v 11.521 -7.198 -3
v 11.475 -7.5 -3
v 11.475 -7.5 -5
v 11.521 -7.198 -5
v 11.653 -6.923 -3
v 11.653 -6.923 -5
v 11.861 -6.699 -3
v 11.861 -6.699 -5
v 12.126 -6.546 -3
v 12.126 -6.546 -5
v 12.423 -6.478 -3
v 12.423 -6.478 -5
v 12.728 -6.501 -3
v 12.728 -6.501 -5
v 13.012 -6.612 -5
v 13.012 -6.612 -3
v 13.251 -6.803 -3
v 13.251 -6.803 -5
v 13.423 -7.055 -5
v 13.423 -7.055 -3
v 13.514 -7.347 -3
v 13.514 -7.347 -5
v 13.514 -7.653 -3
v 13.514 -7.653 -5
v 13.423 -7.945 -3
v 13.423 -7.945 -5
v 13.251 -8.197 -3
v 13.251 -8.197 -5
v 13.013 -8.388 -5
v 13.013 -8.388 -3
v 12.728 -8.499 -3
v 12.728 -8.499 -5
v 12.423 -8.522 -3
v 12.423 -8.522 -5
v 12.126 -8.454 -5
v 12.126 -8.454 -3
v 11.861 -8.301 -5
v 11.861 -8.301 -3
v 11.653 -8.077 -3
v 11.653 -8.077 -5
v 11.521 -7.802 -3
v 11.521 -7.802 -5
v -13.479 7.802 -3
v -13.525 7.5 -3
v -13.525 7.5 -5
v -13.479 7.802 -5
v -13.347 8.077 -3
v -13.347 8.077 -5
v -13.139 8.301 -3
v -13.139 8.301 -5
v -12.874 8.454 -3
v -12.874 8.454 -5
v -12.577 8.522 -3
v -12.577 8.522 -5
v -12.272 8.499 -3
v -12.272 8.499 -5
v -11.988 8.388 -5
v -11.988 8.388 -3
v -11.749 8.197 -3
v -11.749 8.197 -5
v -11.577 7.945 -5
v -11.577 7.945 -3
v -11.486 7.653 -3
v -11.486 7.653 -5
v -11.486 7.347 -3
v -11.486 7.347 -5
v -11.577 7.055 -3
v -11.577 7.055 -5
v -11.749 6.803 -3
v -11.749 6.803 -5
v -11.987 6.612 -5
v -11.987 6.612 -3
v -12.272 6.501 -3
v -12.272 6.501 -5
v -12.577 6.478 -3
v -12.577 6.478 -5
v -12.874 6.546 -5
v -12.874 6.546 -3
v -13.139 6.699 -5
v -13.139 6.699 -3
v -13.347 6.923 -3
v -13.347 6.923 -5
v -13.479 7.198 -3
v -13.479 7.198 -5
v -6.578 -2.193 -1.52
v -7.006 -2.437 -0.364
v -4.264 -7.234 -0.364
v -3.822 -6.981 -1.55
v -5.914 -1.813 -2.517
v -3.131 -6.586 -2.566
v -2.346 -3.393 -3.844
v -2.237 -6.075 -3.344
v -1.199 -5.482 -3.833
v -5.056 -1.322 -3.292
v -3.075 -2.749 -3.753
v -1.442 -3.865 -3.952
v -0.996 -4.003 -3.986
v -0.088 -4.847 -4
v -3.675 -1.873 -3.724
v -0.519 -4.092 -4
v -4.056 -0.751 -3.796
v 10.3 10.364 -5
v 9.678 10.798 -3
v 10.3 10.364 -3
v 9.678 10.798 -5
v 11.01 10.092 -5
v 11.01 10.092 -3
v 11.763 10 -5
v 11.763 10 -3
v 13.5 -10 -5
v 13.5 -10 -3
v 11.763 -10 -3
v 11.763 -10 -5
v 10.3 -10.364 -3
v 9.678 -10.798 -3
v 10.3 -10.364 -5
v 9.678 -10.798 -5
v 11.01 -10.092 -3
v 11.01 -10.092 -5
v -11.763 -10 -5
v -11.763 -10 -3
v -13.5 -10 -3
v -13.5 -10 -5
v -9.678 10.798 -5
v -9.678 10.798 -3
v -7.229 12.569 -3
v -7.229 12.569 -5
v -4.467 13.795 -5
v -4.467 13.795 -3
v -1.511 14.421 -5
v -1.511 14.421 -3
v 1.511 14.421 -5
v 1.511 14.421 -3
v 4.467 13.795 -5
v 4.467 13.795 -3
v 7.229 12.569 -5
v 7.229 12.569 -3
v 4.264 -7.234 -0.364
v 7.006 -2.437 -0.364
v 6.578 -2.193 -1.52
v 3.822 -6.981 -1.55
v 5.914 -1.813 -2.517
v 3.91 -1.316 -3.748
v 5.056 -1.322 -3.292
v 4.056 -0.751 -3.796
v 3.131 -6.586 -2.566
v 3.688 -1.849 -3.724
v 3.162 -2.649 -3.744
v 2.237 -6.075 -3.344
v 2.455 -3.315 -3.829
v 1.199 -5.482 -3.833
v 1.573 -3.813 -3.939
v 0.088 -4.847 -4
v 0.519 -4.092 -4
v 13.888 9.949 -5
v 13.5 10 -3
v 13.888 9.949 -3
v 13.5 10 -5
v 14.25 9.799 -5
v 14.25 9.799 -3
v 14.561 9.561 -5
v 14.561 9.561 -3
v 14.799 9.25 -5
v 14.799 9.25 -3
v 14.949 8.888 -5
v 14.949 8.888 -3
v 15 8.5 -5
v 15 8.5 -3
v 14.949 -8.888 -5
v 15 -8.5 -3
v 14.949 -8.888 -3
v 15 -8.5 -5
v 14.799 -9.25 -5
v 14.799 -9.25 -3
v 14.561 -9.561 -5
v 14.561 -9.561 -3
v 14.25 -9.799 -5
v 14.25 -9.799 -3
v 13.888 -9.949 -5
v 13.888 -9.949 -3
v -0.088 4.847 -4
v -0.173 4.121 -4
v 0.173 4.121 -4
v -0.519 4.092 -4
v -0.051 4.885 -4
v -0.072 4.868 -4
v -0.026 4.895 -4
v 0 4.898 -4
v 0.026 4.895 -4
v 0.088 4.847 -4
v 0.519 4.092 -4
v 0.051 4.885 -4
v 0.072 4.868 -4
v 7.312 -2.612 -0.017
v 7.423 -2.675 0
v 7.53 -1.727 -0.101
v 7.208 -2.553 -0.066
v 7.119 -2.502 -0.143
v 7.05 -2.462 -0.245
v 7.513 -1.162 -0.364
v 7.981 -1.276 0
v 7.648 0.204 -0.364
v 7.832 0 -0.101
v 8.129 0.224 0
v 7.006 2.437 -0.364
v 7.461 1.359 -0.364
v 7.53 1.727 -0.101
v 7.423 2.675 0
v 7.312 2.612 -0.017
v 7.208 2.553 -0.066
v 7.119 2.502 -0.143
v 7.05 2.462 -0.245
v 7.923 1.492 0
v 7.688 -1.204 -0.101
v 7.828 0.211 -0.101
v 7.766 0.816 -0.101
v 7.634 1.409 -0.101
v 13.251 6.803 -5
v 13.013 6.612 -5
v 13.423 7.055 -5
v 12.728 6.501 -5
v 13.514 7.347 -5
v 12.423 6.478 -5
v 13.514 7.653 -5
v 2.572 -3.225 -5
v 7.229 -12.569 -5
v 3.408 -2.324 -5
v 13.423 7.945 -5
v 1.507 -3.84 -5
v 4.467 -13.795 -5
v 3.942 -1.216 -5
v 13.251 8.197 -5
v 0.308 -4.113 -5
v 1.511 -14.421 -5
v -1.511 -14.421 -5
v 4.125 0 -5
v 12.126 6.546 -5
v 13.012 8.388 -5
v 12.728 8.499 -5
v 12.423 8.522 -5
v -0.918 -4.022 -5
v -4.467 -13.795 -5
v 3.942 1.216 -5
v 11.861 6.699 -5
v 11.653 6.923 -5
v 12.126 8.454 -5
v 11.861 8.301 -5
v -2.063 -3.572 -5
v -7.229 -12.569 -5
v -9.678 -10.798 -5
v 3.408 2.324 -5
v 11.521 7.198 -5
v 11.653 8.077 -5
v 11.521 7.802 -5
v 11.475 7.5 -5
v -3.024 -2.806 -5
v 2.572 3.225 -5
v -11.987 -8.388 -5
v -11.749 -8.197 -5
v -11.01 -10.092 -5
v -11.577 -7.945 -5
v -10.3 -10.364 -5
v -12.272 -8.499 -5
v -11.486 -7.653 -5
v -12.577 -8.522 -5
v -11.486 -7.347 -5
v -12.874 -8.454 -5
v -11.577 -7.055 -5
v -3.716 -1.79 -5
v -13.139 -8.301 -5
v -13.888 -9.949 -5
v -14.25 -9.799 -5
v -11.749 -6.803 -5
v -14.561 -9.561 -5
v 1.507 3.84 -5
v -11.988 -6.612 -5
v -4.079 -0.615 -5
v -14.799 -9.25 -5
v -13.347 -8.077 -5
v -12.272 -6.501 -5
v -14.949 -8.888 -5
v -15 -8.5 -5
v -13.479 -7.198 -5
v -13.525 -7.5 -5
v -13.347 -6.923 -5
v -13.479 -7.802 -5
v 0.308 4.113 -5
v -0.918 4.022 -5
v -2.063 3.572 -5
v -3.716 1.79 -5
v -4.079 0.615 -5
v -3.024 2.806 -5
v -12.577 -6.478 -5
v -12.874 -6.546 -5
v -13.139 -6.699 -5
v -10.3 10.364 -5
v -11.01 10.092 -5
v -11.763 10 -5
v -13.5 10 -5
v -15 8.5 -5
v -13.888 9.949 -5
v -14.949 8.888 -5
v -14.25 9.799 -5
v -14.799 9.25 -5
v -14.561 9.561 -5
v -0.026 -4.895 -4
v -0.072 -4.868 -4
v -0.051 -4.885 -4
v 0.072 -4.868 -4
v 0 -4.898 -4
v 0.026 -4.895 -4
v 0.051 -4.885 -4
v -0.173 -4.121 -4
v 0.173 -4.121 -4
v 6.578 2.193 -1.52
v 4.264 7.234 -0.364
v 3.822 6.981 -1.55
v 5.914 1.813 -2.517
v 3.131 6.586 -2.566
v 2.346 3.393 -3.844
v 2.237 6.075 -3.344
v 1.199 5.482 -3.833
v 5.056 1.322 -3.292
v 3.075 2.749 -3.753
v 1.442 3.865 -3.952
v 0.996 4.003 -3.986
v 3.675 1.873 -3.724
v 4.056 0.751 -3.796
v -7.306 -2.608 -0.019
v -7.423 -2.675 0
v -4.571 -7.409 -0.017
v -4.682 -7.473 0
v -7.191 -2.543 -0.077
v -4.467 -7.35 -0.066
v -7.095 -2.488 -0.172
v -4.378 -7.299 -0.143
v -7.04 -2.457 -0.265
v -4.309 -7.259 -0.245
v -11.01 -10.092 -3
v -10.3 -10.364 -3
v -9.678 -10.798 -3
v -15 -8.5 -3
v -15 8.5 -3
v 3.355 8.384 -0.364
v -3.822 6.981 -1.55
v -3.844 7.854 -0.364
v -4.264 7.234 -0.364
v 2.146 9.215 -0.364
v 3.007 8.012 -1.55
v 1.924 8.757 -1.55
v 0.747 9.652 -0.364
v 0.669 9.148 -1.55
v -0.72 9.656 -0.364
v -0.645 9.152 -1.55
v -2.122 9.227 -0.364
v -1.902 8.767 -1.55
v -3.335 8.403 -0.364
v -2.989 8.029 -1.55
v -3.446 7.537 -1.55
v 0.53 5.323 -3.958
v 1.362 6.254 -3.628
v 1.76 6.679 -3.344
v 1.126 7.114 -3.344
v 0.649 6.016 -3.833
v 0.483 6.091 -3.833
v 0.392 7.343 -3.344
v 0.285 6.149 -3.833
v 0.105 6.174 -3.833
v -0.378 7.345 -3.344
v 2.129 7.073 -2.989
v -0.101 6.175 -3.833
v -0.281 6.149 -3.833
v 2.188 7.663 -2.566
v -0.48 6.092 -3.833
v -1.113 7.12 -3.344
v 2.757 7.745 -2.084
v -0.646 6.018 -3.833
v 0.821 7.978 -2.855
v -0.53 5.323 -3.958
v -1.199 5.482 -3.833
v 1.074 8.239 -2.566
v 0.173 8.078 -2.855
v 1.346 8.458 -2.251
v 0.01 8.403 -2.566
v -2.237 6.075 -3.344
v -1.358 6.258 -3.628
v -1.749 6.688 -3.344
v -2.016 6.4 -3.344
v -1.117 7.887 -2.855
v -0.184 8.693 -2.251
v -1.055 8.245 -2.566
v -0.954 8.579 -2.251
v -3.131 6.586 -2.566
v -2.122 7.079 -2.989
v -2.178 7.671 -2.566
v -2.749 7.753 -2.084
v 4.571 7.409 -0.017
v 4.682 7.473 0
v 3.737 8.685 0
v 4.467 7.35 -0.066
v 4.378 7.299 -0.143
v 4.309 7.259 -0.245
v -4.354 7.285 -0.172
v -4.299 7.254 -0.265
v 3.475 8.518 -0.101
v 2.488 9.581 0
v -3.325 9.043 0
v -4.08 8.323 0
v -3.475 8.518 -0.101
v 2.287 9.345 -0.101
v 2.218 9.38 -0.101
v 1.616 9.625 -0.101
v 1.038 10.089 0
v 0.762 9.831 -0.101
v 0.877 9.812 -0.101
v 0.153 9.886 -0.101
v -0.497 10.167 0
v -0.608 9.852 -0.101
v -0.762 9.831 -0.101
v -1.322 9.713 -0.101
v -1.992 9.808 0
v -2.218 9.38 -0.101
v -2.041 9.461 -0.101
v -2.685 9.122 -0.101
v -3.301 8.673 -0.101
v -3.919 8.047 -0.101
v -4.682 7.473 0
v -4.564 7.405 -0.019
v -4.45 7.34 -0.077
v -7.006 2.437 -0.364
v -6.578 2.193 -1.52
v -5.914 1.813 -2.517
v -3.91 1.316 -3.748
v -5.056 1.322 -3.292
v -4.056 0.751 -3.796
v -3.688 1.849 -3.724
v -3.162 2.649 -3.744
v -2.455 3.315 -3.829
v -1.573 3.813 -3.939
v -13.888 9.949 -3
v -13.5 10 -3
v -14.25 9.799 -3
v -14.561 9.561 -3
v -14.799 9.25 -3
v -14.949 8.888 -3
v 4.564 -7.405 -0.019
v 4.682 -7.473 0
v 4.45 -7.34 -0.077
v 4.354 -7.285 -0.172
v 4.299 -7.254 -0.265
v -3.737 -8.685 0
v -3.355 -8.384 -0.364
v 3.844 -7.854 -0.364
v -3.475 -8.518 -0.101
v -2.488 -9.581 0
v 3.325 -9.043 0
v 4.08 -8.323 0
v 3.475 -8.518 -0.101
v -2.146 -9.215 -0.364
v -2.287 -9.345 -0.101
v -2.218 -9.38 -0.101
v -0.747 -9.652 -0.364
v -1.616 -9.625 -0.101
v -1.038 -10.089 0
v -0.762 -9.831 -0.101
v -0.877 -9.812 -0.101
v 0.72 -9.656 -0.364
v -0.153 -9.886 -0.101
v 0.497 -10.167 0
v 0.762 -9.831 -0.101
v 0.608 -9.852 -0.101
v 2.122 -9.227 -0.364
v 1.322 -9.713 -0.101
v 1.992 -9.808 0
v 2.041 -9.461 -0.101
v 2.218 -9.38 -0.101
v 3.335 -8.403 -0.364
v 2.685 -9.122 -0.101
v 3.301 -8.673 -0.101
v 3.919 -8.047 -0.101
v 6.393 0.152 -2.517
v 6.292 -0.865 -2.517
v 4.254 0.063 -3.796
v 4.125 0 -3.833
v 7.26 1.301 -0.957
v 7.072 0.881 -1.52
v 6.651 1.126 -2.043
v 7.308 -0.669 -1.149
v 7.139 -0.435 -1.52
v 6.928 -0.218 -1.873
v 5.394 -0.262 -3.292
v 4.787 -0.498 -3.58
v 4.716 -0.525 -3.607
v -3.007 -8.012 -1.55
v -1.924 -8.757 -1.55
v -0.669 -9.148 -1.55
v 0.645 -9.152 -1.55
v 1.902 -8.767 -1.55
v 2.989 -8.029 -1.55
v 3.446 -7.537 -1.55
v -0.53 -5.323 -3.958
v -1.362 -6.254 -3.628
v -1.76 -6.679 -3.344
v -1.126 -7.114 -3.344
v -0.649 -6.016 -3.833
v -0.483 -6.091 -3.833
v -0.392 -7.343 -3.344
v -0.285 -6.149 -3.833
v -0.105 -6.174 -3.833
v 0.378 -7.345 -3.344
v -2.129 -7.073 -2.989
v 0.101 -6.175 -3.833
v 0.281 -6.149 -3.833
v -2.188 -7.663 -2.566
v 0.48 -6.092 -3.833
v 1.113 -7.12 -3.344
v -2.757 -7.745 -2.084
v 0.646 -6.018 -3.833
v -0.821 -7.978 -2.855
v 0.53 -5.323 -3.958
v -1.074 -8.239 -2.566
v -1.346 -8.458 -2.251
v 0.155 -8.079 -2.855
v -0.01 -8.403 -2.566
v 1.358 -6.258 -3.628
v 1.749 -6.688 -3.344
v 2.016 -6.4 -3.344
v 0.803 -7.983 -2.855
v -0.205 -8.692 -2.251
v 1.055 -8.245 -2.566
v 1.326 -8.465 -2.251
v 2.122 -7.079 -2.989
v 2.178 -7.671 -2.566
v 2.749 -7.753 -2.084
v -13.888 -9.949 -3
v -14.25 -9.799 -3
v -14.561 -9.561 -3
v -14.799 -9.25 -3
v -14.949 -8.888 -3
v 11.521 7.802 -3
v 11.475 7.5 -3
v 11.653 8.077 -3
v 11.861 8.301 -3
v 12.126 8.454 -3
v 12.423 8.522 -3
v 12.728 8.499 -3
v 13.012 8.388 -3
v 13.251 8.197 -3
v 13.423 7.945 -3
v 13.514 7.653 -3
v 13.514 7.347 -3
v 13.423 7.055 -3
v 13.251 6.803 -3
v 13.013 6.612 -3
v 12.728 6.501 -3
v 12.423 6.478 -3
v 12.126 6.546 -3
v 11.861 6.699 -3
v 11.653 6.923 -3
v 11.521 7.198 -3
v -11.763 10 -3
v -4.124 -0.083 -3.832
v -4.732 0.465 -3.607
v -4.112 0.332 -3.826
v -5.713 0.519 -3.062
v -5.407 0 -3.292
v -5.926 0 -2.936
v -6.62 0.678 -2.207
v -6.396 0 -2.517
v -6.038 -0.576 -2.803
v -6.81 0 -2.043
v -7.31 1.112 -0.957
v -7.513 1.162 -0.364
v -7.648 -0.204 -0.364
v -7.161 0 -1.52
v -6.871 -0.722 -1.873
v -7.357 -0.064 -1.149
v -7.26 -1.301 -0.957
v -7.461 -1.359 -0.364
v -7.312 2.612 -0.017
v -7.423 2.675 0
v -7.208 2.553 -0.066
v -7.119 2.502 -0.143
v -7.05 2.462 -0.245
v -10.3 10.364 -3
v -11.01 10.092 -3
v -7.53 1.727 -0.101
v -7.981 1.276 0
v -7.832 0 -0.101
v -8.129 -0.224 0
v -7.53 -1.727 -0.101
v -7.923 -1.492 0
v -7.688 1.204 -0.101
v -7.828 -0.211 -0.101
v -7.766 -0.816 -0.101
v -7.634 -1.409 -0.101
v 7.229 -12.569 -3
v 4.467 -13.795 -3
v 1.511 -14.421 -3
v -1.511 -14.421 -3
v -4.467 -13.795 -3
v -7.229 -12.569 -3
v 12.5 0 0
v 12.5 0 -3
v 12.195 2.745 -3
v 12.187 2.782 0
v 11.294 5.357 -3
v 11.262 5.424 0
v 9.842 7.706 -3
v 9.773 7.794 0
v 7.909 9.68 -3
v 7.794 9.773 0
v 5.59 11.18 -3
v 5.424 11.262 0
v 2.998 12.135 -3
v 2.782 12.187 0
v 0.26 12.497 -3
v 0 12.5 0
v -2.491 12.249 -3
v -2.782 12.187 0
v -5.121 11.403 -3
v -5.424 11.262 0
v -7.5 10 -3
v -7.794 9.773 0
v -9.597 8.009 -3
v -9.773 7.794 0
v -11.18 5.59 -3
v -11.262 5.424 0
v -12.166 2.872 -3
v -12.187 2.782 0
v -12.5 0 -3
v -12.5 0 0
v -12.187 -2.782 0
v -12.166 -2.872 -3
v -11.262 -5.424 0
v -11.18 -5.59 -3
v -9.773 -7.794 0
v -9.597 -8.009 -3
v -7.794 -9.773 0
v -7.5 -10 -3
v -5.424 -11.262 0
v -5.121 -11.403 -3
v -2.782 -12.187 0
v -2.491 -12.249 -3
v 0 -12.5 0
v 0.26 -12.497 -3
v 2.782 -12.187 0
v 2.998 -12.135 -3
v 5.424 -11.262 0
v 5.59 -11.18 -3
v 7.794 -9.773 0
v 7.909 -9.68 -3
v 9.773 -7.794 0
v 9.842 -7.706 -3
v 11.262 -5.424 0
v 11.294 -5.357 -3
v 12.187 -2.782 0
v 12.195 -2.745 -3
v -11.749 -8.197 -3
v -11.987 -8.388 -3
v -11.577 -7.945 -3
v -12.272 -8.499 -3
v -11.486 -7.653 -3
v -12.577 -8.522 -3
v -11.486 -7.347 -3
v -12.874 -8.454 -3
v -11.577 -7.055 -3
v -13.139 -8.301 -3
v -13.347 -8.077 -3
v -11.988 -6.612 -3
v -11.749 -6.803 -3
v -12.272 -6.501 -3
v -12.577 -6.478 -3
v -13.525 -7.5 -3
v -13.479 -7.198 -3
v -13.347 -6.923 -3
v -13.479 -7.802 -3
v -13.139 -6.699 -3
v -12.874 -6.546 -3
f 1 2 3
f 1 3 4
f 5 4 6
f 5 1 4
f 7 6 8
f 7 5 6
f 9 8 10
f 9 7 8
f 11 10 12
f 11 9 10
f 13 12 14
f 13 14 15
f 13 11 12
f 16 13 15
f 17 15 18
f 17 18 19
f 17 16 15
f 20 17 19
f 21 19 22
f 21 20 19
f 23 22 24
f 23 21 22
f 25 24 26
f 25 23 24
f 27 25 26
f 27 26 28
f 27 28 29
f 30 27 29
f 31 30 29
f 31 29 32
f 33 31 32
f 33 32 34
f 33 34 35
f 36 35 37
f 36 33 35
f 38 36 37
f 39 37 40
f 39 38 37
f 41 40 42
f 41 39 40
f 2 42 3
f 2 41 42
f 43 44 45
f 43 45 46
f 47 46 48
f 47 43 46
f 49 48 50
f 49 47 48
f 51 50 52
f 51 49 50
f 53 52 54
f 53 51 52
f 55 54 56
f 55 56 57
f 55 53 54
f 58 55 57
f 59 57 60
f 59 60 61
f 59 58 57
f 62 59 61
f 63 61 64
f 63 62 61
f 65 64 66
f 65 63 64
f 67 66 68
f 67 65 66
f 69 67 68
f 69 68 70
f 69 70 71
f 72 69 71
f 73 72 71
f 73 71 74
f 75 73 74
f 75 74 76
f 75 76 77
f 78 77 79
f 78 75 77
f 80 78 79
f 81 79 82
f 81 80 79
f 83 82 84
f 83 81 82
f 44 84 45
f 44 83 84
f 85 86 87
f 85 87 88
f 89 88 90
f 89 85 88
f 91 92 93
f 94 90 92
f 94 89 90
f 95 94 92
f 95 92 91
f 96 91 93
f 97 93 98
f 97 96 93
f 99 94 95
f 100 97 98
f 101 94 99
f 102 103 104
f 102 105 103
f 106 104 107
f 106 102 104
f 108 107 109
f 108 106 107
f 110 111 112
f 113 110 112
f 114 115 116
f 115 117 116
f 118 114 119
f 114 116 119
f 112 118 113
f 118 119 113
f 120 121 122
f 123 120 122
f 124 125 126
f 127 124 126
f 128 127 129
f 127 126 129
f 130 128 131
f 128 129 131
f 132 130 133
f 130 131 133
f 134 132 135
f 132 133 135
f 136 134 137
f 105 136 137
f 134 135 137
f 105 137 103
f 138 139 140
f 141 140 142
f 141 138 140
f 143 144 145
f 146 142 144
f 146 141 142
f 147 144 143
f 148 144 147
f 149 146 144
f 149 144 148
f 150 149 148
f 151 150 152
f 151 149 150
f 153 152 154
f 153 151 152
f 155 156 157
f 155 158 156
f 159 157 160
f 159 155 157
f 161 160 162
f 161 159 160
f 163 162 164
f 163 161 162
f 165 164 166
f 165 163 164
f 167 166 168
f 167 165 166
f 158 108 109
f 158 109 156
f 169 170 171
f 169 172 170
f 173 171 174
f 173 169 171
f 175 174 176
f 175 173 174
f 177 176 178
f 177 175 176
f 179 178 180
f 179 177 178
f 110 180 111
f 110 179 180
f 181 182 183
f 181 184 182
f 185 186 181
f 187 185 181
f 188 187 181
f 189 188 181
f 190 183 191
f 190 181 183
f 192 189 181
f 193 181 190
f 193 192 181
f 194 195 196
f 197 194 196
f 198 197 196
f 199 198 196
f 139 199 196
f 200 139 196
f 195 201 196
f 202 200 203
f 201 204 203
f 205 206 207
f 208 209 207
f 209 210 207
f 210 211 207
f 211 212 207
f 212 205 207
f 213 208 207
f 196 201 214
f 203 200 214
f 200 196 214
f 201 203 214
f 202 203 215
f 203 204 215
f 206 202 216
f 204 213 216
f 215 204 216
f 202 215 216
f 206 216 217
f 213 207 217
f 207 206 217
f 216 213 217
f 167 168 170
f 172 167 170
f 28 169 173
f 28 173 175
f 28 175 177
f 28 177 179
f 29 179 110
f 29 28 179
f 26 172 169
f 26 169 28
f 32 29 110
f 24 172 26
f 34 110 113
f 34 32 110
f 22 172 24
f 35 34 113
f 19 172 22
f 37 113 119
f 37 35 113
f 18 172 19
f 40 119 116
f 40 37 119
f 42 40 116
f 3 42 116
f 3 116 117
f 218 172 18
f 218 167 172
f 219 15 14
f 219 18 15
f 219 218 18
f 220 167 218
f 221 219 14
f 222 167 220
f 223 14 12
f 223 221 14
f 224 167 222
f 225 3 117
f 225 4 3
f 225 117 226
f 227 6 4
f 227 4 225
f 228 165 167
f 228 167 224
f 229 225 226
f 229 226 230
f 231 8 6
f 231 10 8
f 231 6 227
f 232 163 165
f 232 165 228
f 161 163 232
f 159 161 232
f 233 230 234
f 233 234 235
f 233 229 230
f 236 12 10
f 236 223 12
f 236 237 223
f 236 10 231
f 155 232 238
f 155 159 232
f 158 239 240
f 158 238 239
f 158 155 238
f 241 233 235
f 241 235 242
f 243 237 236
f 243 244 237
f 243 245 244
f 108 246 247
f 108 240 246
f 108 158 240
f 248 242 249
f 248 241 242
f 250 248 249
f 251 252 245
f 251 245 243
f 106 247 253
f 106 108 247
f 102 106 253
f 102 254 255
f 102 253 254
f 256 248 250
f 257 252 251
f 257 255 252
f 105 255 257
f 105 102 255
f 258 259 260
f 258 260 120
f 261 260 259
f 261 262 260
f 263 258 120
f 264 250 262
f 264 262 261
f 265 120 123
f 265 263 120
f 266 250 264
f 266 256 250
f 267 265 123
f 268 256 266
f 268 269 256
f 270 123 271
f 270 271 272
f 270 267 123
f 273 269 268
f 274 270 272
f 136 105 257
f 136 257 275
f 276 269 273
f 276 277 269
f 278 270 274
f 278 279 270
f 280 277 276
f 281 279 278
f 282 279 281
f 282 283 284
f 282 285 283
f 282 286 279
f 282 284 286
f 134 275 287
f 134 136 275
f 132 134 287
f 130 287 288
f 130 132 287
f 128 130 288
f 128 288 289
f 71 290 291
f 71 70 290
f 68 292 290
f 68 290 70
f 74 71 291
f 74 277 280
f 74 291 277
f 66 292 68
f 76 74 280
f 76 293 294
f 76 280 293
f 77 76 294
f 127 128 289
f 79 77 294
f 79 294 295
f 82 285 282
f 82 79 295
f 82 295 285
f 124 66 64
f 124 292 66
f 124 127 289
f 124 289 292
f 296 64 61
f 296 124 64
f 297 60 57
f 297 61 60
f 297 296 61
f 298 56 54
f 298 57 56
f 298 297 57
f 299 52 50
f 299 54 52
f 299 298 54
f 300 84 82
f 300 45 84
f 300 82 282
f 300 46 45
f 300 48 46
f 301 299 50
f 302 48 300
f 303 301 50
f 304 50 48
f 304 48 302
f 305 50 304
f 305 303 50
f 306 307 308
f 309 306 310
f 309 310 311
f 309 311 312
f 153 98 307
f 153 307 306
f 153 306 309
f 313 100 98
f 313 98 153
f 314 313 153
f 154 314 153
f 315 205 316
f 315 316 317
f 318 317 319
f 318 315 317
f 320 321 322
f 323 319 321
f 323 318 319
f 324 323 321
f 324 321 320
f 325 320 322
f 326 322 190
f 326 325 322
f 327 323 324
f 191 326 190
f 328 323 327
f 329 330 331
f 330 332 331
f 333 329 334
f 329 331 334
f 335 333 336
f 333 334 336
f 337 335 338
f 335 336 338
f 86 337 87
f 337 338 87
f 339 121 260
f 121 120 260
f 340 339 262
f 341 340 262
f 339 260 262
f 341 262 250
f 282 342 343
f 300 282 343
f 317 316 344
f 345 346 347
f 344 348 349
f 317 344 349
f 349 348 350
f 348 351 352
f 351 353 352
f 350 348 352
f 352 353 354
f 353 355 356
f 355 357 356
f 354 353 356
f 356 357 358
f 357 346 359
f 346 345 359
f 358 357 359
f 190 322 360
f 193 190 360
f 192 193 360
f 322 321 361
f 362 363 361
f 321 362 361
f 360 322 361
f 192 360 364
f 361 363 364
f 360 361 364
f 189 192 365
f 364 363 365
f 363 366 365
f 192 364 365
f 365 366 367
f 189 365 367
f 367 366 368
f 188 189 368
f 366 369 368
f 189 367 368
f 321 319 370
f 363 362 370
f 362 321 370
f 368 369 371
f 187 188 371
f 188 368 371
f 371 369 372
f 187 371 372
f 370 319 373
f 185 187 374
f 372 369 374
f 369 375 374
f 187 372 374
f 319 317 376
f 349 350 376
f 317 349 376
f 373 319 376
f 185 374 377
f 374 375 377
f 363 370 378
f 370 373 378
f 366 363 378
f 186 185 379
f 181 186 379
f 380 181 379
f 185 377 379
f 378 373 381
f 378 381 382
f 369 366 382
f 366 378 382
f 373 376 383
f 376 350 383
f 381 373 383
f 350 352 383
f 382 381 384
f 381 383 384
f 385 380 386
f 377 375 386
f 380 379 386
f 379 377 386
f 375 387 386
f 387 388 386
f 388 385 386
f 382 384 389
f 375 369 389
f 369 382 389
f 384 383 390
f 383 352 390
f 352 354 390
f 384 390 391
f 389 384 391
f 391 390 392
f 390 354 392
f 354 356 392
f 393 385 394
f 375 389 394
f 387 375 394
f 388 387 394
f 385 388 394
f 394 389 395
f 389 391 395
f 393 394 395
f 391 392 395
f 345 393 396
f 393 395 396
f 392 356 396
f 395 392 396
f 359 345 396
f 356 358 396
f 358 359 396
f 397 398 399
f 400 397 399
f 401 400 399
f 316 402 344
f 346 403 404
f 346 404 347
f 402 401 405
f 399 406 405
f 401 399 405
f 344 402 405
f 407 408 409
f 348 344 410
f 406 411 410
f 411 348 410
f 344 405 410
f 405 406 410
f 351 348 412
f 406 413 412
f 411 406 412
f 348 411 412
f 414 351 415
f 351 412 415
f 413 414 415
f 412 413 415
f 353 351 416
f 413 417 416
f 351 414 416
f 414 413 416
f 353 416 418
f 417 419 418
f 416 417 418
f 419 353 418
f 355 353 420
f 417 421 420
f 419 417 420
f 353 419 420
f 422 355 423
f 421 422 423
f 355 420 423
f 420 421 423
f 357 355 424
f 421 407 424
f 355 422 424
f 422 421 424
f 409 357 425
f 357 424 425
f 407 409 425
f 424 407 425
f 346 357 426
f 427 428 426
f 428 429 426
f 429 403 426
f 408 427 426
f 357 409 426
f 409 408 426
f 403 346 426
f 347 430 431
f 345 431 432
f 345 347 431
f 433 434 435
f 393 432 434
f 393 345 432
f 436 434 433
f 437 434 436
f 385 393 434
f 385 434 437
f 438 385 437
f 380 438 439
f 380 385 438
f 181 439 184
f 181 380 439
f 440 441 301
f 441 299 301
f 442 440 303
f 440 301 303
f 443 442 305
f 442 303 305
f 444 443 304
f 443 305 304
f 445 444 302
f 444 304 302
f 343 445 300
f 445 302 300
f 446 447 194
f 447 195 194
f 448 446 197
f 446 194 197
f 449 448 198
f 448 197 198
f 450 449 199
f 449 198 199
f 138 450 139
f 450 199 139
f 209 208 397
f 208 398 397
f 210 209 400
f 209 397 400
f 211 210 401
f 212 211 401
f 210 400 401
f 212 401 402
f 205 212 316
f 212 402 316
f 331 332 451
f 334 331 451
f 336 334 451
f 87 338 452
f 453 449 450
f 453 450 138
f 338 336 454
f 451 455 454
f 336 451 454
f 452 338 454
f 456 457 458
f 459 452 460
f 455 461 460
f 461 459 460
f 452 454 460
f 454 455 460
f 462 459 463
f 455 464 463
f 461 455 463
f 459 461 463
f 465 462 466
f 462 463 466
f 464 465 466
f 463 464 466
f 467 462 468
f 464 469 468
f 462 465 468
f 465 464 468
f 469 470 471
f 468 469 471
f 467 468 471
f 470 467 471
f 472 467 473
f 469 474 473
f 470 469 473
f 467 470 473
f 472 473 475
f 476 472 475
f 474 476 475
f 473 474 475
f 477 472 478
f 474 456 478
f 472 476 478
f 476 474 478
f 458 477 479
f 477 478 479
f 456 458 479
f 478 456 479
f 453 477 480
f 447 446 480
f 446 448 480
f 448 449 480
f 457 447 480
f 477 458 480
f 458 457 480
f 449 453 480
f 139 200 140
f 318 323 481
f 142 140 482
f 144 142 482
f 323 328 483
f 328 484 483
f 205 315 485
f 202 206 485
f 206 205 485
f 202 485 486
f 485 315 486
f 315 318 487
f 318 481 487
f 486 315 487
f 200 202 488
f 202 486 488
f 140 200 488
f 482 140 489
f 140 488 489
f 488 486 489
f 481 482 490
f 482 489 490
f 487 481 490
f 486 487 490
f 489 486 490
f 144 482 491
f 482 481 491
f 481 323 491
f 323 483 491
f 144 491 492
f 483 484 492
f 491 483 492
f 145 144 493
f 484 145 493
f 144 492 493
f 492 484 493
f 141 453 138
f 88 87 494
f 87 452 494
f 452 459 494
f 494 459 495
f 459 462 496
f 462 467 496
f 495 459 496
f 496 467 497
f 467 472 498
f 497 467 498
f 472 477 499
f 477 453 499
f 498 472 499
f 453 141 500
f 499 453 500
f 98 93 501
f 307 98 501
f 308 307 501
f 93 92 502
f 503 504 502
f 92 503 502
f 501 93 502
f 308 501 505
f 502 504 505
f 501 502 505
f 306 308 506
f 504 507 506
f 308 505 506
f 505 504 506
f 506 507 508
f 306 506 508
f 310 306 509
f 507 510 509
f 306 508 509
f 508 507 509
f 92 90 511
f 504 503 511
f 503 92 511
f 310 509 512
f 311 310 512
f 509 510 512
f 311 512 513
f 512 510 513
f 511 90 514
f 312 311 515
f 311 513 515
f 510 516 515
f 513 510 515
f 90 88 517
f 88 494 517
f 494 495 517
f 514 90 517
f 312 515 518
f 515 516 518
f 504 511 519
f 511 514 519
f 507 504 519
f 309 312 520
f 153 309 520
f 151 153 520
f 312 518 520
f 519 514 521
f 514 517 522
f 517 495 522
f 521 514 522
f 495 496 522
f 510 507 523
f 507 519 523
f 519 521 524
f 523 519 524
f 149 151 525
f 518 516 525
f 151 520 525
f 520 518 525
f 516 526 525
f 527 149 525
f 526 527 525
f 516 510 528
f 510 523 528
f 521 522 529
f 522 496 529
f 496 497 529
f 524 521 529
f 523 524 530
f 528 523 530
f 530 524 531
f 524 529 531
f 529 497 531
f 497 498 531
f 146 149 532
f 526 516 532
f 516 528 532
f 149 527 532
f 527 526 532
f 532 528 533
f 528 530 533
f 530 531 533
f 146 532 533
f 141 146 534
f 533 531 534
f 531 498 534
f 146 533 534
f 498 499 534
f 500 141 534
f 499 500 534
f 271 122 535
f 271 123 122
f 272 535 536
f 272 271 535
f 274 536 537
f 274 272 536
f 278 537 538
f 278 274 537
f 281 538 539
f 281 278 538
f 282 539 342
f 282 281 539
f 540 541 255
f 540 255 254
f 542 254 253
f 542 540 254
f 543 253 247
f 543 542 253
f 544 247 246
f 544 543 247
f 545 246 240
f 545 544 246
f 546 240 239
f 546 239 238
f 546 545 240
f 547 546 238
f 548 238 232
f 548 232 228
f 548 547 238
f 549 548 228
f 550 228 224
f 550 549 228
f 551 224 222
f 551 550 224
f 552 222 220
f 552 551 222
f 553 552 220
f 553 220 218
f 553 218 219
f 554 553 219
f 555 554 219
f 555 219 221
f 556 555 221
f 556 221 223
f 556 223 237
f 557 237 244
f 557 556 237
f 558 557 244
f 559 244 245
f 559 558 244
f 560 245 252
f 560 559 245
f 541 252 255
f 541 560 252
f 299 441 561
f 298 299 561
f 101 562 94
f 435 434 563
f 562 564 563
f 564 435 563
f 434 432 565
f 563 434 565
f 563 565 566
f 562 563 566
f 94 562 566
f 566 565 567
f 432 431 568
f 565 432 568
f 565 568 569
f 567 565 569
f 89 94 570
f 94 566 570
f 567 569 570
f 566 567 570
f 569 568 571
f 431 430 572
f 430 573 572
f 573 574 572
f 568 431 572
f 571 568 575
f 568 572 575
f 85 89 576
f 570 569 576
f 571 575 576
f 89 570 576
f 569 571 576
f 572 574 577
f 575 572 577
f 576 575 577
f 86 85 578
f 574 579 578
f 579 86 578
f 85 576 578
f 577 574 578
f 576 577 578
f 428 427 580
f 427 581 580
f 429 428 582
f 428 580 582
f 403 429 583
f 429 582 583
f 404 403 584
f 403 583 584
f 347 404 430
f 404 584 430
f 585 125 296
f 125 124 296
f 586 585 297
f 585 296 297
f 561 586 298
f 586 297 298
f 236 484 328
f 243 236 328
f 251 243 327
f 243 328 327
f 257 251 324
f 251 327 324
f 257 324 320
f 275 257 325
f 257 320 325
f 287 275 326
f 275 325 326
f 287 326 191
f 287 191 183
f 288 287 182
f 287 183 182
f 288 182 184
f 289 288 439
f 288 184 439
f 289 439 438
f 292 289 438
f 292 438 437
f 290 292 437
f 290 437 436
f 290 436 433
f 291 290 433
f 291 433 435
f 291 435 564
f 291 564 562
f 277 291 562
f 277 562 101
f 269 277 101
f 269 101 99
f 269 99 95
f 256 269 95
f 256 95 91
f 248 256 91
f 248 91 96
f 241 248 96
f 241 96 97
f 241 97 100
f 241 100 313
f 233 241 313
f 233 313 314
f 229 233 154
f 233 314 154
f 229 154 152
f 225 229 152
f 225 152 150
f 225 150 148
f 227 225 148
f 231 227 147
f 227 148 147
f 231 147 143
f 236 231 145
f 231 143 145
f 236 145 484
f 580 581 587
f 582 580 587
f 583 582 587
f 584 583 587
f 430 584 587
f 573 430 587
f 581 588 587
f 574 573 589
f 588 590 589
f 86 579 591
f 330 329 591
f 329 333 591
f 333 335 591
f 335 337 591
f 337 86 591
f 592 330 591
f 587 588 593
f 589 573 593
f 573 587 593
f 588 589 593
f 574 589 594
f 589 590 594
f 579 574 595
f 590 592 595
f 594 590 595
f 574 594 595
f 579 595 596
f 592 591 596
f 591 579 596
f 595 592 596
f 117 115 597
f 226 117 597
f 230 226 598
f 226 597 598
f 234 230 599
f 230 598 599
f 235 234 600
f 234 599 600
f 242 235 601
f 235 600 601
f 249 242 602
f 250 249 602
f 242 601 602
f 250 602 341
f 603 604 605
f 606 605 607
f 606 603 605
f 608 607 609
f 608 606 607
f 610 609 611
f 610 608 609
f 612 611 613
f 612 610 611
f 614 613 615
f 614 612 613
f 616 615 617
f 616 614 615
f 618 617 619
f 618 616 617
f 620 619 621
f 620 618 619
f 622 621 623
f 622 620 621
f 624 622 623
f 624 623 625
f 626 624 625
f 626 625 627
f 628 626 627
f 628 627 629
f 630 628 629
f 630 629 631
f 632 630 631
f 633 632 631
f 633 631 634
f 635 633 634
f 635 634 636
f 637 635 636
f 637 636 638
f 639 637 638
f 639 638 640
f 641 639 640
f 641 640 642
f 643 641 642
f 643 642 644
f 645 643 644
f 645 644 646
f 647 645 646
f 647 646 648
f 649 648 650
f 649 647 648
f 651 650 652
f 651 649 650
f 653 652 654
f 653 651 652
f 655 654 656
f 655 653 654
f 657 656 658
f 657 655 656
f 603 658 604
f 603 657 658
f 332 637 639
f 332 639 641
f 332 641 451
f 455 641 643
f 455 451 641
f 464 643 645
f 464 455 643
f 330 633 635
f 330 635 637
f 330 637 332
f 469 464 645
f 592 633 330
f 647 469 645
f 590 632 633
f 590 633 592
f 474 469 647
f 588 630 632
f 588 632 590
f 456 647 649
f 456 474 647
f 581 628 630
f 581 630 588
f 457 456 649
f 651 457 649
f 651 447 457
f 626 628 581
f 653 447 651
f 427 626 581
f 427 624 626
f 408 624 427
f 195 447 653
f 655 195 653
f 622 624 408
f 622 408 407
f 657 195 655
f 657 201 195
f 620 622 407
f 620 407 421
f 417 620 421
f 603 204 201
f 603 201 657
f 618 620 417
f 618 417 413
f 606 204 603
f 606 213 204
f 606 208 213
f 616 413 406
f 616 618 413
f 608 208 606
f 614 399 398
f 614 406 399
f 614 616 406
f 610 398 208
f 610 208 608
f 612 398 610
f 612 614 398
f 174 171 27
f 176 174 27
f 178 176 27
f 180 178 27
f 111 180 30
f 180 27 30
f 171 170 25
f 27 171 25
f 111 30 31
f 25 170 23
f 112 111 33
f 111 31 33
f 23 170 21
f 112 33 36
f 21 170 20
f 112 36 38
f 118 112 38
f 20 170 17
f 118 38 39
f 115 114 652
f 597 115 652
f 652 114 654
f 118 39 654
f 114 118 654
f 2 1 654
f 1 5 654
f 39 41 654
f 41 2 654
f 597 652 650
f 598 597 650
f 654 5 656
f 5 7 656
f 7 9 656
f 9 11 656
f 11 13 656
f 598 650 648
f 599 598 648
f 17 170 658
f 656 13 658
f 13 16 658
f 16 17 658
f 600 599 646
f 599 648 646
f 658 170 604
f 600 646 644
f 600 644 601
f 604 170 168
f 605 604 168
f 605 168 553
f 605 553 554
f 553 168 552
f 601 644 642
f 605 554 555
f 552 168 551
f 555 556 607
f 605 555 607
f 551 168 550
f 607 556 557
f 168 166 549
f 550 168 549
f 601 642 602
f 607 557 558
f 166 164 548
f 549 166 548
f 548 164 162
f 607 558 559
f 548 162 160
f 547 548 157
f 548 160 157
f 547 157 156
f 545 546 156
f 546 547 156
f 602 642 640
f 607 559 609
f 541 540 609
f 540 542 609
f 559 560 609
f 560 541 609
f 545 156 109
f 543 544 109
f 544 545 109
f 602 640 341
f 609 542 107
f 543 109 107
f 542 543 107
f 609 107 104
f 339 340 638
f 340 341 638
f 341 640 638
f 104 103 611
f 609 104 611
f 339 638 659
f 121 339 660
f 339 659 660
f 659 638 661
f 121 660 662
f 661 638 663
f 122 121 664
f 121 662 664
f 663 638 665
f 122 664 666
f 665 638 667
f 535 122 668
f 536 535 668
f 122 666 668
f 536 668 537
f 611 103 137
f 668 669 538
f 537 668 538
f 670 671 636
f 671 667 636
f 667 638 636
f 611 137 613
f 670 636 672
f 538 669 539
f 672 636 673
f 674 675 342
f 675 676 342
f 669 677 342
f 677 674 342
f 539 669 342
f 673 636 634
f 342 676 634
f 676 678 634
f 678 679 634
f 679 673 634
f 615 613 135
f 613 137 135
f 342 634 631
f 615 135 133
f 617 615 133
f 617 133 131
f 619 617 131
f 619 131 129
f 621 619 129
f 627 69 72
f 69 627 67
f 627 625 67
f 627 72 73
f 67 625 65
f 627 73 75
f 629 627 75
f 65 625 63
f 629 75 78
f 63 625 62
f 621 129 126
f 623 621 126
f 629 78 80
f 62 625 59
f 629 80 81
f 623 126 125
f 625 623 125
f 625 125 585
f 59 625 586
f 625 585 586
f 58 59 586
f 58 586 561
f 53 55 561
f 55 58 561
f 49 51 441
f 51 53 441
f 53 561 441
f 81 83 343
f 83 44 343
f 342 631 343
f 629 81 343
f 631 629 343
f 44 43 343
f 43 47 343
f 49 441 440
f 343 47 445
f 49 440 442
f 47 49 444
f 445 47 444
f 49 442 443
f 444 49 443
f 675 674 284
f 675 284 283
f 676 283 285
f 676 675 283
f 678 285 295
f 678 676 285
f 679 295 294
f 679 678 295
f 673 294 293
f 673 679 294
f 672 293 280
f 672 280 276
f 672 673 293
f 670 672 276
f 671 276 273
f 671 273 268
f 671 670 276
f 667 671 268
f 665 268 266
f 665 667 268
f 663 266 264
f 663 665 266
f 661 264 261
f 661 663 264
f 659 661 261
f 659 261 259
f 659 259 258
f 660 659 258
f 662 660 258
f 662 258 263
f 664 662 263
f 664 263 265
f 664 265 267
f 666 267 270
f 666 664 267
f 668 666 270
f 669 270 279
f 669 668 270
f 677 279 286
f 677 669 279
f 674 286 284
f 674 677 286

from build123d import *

# Parameters (mm, degrees)
SKETCH1_R           = 15
BOSS_EXTRUDE1_DEPTH = 5
CUT_EXTRUDE1_DEPTH  = 4
FILLET1_R           = 5
FILLET2_R           = 5
SKETCH4_R           = 4.125
CUT_EXTRUDE2_DEPTH  = 22.794494718
SKETCH7_R           = 15
SKETCH7_R_2         = 12.5
CUT_EXTRUDE3_DEPTH  = 22.794494741
BOSS_EXTRUDE4_START = -2
SKETCH10_R          = 1.025
BOSS_EXTRUDE4_DEPTH = 2
FILLET5_R           = 1.5
BOSS_EXTRUDE5_START = -2
BOSS_EXTRUDE5_DEPTH = 2
FILLET6_R           = 3.125
FILLET7_R           = 0.5


with BuildPart() as part:
    # Sketch1 → Boss-Extrude1 (new body)
    with BuildSketch(Plane.XY):
        Circle(SKETCH1_R)
    extrude(amount=-BOSS_EXTRUDE1_DEPTH)

    # Sketch3 → Cut-Extrude1 (cut)
    with BuildSketch(Plane.XY):
        Polygon((8.5, 0), (0, 14.875), (-8.5, 0), (0, -14.875), align=None)
    extrude(amount=-CUT_EXTRUDE1_DEPTH, mode=Mode.SUBTRACT)

    # Fillet1
    fillet1_edges = [part.edges().sort_by_distance(p)[0] for p in [
        (0, 14.875, -2),
        (8.5, 0, -2),
        (0, -14.875, -2),
        (-8.5, 0, -2),
    ]]
    fillet(fillet1_edges, radius=FILLET1_R)

    # Fillet2
    # the kernel refuses this fillet: 5 mm, written as the material it adds along each edge
    with BuildSketch(Plane(origin=(0, -4.797177815, -4), x_dir=(-0.8682431421244594, -0.4961389383568335, 0), z_dir=(-0.4961389383568335, 0.8682431421244594, 0))) as fillet2_piece_1:
        with BuildLine():
            CenterArc((0.101020514, 5), FILLET2_R, 270, 78.463040967)
            Line((0.101020514, 0), (0.101020514, -0.1))
            Line((0.101020514, -0.1), (5, -0.1))
            Line((5, -0.1), (5.1, 0))
            ThreePointArc((5.1, 0), (5.1, 2), (5.09797959, 3.98))
            Line((5.09797959, 3.98), (5, 4))
        make_face()
    revolve(axis=Axis((0, -4.797177815, -4), (0, 0, 1)), revolution_arc=120.510237406)
    with BuildSketch(Plane(origin=(-7.082460176, -2.480694692, -4), x_dir=(1.3436192329677e-12, 7.677824188386856e-13, 1.0), z_dir=(0.49613893835683387, -0.8682431421244593, 0)), Plane(origin=(-4.341215711, 7.277872506, -4), x_dir=(1.3880008253859177e-12, -7.93143328791953e-13, 1.0), z_dir=(-0.49613893835683387, -0.8682431421244591, 0)), Plane(origin=(7.082460176, 2.480694692, -4), x_dir=(-1.3700903659455922e-12, -7.829087805403382e-13, 1.0), z_dir=(-0.49613893835683376, 0.8682431421244593, 0)), Plane(origin=(4.341215711, -7.277872506, -4), x_dir=(-1.3859204382413136e-12, 7.919545361378934e-13, 1.0), z_dir=(0.49613893835683387, 0.8682431421244593, 0))) as fillet2_piece_2:
        with BuildLine():
            CenterArc((5, -4.898979486), FILLET2_R, 101.536959033, 78.463040967)
            Line((0, -4.898979486), (-0.1, -4.898979486))
            Line((-0.1, -4.898979486), (-0.1, 0))
            Line((-0.1, 0), (0, 0.1))
            ThreePointArc((0, 0.1), (2, 0.1), (3.98, 0.09797959))
            Line((3.98, 0.09797959), (4, 0))
        make_face()
    extrude(amount=5.525154858)
    with BuildSketch(Plane(origin=(-2.741244466, 0, -4), x_dir=(-0.8682431421244594, 0.4961389383568336, 0), z_dir=(0.4961389383568336, 0.8682431421244594, 0))) as fillet2_piece_3:
        with BuildLine():
            CenterArc((0.101020514, 5), FILLET2_R, 270, 78.463040967)
            Line((0.101020514, 0), (0.101020514, -0.1))
            Line((0.101020514, -0.1), (5, -0.1))
            Line((5, -0.1), (5.1, 0))
            ThreePointArc((5.1, 0), (5.1, 2), (5.09797959, 3.98))
            Line((5.09797959, 3.98), (5, 4))
        make_face()
    revolve(axis=Axis((-2.741244466, 0, -4), (0, 0, 1)), revolution_arc=59.489762594)
    with BuildSketch(Plane(origin=(0, 4.797177815, -4), x_dir=(0.8682431421244594, 0.4961389383568332, 0), z_dir=(0.4961389383568332, -0.8682431421244594, 0))) as fillet2_piece_4:
        with BuildLine():
            CenterArc((0.101020514, 5), FILLET2_R, 270, 78.463040967)
            Line((0.101020514, 0), (0.101020514, -0.1))
            Line((0.101020514, -0.1), (5, -0.1))
            Line((5, -0.1), (5.1, 0))
            ThreePointArc((5.1, 0), (5.1, 2), (5.09797959, 3.98))
            Line((5.09797959, 3.98), (5, 4))
        make_face()
    revolve(axis=Axis((0, 4.797177815, -4), (0, 0, 1)), revolution_arc=120.510237406)
    with BuildSketch(Plane(origin=(2.741244466, 0, -4), x_dir=(0.8682431421244592, 0.49613893835683376, 0), z_dir=(-0.49613893835683376, 0.8682431421244592, 0))) as fillet2_piece_5:
        with BuildLine():
            CenterArc((0.101020514, -5), FILLET2_R, 11.536959033, 78.463040967)
            Line((0.101020514, 0), (0.101020514, 0.1))
            Line((0.101020514, 0.1), (5, 0.1))
            Line((5, 0.1), (5.1, 0))
            ThreePointArc((5.1, 0), (5.1, -2), (5.09797959, -3.98))
            Line((5.09797959, -3.98), (5, -4))
        make_face()
    revolve(axis=Axis((2.741244466, 0, -4), (0, 0, -1)), revolution_arc=59.489762594)

    # Sketch4 → Cut-Extrude2 (cut, through all)
    with BuildSketch(Plane.XY):
        Circle(SKETCH4_R)
    extrude(amount=-CUT_EXTRUDE2_DEPTH, mode=Mode.SUBTRACT)

    # Sketch7 → Cut-Extrude3 (cut, through all)
    with BuildSketch(Plane.XY):
        Circle(SKETCH7_R)
        Circle(SKETCH7_R_2, mode=Mode.SUBTRACT)
    extrude(amount=-CUT_EXTRUDE3_DEPTH, mode=Mode.SUBTRACT)

    # Sketch10 → Boss-Extrude4 (add)
    # profile 1 of 2: a face of its own
    with BuildSketch(Plane(origin=(0, 0, -5), x_dir=(-1, 0, 0), z_dir=(0, 0, -1)).offset(BOSS_EXTRUDE4_START)):
        with BuildLine():
            Line((15, 10), (7.5, 10))
            ThreePointArc((7.5, 10), (11.180339887, 5.590169944), (12.5, 0))
            ThreePointArc((12.5, 0), (11.180339887, -5.590169944), (7.5, -10))
            Line((7.5, -10), (15, -10))
            Line((15, -10), (15, 10))
        make_face()
        with Locations((12.5, -7.5)):
            Circle(SKETCH10_R, mode=Mode.SUBTRACT)
        with Locations((12.5, 7.5)):
            Circle(SKETCH10_R, mode=Mode.SUBTRACT)
    # profile 2 of 2: a face of its own
    with BuildSketch(Plane(origin=(0, 0, -5), x_dir=(-1, 0, 0), z_dir=(0, 0, -1)).offset(BOSS_EXTRUDE4_START)):
        with BuildLine():
            Line((-7.5, 10), (-15, 10))
            Line((-15, 10), (-15, -10))
            Line((-15, -10), (-7.5, -10))
            ThreePointArc((-7.5, -10), (-12.5, 0), (-7.5, 10))
        make_face()
        with Locations((-12.5, -7.5)):
            Circle(SKETCH10_R, mode=Mode.SUBTRACT)
        with Locations((-12.5, 7.5)):
            Circle(SKETCH10_R, mode=Mode.SUBTRACT)
    extrude(amount=BOSS_EXTRUDE4_DEPTH)

    # Fillet5
    fillet5_edges = [part.edges().sort_by_distance(p)[0] for p in [
        (15, -10, -4),
        (15, 10, -4),
        (-15, 10, -4),
        (-15, -10, -4),
    ]]
    fillet(fillet5_edges, radius=FILLET5_R)

    # Sketch11 → Boss-Extrude5 (add)
    with BuildSketch(Plane(origin=(0, 0, -5), x_dir=(-1, 0, 0), z_dir=(0, 0, -1)).offset(BOSS_EXTRUDE5_START)):
        with BuildLine():
            ThreePointArc((-7.5, 10), (0, 12.5), (7.5, 10))
            Line((7.5, 10), (10.5, 10))
            ThreePointArc((10.5, 10), (0, 14.5), (-10.5, 10))
            Line((-10.5, 10), (-7.5, 10))
        make_face()
        with BuildLine():
            Line((10.5, -10), (7.5, -10))
            ThreePointArc((7.5, -10), (0, -12.5), (-7.5, -10))
            Line((-7.5, -10), (-10.5, -10))
            ThreePointArc((-10.5, -10), (0, -14.5), (10.5, -10))
        make_face()
    extrude(amount=BOSS_EXTRUDE5_DEPTH)

    # Fillet6
    fillet6_edges = [part.edges().sort_by_distance(p)[0] for p in [
        (-10.5, 10, -4),
        (10.5, 10, -4),
        (10.5, -10, -4),
        (-10.5, -10, -4),
    ]]
    fillet(fillet6_edges, radius=FILLET6_R)

    # Fillet7
    fillet7_edges = [part.edges().sort_by_distance(p)[0] for p in [
        (5.711837943, 4.879283599, 0),
        (5.711837943, -4.879283599, 0),
        (-5.711837943, -4.879283599, 0),
        (-5.711837943, 4.879283599, 0),
        (7.741244466, 0, 0),
        (0, -9.797177815, 0),
        (-7.741244466, 0, 0),
        (0, 9.797177815, 0),
    ]]
    fillet(fillet7_edges, radius=FILLET7_R)


solid = part.part
